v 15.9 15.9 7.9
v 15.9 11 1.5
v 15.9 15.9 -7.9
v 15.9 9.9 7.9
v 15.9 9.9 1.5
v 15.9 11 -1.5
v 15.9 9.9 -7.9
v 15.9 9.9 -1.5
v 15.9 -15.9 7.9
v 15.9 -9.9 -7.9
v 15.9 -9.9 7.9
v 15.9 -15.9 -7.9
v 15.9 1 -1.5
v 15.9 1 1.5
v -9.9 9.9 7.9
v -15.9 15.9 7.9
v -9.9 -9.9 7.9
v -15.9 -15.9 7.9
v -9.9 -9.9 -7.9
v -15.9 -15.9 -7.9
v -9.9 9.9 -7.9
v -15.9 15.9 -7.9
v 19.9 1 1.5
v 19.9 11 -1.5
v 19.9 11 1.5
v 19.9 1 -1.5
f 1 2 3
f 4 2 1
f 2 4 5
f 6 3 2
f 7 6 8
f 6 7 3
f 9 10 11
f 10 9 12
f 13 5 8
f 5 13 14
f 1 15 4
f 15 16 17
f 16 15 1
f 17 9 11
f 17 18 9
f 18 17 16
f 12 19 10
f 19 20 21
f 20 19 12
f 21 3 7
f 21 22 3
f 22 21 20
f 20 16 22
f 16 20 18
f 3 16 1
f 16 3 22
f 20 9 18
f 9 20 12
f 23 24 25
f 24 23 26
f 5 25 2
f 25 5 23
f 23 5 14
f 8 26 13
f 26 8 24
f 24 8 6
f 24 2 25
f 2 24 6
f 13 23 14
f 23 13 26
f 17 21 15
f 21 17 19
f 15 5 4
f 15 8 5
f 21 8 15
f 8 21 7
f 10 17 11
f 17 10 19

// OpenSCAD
$fn=64;

module u_channel_bracket(
    size_x=31.8,
    size_y=31.8,
    size_z=15.8,
    web=6.0,
    jaw=6.0,
    lug_x=4.0,
    lug_y=10.0,
    lug_z=3.0,
    lug_offset_y=6.0
){
    inner_x = size_x - web;
    inner_y = size_y - 2*jaw;

    difference(){
        union(){
            cube([size_x, size_y, size_z], center=true);

            translate([ size_x/2 + lug_x/2, lug_offset_y, 0 ])
                cube([lug_x, lug_y, lug_z], center=true);
        }

        translate([ web/2, 0, 0 ])
            cube([inner_x, inner_y, size_z+0.2], center=true);
    }
}

u_channel_bracket();
